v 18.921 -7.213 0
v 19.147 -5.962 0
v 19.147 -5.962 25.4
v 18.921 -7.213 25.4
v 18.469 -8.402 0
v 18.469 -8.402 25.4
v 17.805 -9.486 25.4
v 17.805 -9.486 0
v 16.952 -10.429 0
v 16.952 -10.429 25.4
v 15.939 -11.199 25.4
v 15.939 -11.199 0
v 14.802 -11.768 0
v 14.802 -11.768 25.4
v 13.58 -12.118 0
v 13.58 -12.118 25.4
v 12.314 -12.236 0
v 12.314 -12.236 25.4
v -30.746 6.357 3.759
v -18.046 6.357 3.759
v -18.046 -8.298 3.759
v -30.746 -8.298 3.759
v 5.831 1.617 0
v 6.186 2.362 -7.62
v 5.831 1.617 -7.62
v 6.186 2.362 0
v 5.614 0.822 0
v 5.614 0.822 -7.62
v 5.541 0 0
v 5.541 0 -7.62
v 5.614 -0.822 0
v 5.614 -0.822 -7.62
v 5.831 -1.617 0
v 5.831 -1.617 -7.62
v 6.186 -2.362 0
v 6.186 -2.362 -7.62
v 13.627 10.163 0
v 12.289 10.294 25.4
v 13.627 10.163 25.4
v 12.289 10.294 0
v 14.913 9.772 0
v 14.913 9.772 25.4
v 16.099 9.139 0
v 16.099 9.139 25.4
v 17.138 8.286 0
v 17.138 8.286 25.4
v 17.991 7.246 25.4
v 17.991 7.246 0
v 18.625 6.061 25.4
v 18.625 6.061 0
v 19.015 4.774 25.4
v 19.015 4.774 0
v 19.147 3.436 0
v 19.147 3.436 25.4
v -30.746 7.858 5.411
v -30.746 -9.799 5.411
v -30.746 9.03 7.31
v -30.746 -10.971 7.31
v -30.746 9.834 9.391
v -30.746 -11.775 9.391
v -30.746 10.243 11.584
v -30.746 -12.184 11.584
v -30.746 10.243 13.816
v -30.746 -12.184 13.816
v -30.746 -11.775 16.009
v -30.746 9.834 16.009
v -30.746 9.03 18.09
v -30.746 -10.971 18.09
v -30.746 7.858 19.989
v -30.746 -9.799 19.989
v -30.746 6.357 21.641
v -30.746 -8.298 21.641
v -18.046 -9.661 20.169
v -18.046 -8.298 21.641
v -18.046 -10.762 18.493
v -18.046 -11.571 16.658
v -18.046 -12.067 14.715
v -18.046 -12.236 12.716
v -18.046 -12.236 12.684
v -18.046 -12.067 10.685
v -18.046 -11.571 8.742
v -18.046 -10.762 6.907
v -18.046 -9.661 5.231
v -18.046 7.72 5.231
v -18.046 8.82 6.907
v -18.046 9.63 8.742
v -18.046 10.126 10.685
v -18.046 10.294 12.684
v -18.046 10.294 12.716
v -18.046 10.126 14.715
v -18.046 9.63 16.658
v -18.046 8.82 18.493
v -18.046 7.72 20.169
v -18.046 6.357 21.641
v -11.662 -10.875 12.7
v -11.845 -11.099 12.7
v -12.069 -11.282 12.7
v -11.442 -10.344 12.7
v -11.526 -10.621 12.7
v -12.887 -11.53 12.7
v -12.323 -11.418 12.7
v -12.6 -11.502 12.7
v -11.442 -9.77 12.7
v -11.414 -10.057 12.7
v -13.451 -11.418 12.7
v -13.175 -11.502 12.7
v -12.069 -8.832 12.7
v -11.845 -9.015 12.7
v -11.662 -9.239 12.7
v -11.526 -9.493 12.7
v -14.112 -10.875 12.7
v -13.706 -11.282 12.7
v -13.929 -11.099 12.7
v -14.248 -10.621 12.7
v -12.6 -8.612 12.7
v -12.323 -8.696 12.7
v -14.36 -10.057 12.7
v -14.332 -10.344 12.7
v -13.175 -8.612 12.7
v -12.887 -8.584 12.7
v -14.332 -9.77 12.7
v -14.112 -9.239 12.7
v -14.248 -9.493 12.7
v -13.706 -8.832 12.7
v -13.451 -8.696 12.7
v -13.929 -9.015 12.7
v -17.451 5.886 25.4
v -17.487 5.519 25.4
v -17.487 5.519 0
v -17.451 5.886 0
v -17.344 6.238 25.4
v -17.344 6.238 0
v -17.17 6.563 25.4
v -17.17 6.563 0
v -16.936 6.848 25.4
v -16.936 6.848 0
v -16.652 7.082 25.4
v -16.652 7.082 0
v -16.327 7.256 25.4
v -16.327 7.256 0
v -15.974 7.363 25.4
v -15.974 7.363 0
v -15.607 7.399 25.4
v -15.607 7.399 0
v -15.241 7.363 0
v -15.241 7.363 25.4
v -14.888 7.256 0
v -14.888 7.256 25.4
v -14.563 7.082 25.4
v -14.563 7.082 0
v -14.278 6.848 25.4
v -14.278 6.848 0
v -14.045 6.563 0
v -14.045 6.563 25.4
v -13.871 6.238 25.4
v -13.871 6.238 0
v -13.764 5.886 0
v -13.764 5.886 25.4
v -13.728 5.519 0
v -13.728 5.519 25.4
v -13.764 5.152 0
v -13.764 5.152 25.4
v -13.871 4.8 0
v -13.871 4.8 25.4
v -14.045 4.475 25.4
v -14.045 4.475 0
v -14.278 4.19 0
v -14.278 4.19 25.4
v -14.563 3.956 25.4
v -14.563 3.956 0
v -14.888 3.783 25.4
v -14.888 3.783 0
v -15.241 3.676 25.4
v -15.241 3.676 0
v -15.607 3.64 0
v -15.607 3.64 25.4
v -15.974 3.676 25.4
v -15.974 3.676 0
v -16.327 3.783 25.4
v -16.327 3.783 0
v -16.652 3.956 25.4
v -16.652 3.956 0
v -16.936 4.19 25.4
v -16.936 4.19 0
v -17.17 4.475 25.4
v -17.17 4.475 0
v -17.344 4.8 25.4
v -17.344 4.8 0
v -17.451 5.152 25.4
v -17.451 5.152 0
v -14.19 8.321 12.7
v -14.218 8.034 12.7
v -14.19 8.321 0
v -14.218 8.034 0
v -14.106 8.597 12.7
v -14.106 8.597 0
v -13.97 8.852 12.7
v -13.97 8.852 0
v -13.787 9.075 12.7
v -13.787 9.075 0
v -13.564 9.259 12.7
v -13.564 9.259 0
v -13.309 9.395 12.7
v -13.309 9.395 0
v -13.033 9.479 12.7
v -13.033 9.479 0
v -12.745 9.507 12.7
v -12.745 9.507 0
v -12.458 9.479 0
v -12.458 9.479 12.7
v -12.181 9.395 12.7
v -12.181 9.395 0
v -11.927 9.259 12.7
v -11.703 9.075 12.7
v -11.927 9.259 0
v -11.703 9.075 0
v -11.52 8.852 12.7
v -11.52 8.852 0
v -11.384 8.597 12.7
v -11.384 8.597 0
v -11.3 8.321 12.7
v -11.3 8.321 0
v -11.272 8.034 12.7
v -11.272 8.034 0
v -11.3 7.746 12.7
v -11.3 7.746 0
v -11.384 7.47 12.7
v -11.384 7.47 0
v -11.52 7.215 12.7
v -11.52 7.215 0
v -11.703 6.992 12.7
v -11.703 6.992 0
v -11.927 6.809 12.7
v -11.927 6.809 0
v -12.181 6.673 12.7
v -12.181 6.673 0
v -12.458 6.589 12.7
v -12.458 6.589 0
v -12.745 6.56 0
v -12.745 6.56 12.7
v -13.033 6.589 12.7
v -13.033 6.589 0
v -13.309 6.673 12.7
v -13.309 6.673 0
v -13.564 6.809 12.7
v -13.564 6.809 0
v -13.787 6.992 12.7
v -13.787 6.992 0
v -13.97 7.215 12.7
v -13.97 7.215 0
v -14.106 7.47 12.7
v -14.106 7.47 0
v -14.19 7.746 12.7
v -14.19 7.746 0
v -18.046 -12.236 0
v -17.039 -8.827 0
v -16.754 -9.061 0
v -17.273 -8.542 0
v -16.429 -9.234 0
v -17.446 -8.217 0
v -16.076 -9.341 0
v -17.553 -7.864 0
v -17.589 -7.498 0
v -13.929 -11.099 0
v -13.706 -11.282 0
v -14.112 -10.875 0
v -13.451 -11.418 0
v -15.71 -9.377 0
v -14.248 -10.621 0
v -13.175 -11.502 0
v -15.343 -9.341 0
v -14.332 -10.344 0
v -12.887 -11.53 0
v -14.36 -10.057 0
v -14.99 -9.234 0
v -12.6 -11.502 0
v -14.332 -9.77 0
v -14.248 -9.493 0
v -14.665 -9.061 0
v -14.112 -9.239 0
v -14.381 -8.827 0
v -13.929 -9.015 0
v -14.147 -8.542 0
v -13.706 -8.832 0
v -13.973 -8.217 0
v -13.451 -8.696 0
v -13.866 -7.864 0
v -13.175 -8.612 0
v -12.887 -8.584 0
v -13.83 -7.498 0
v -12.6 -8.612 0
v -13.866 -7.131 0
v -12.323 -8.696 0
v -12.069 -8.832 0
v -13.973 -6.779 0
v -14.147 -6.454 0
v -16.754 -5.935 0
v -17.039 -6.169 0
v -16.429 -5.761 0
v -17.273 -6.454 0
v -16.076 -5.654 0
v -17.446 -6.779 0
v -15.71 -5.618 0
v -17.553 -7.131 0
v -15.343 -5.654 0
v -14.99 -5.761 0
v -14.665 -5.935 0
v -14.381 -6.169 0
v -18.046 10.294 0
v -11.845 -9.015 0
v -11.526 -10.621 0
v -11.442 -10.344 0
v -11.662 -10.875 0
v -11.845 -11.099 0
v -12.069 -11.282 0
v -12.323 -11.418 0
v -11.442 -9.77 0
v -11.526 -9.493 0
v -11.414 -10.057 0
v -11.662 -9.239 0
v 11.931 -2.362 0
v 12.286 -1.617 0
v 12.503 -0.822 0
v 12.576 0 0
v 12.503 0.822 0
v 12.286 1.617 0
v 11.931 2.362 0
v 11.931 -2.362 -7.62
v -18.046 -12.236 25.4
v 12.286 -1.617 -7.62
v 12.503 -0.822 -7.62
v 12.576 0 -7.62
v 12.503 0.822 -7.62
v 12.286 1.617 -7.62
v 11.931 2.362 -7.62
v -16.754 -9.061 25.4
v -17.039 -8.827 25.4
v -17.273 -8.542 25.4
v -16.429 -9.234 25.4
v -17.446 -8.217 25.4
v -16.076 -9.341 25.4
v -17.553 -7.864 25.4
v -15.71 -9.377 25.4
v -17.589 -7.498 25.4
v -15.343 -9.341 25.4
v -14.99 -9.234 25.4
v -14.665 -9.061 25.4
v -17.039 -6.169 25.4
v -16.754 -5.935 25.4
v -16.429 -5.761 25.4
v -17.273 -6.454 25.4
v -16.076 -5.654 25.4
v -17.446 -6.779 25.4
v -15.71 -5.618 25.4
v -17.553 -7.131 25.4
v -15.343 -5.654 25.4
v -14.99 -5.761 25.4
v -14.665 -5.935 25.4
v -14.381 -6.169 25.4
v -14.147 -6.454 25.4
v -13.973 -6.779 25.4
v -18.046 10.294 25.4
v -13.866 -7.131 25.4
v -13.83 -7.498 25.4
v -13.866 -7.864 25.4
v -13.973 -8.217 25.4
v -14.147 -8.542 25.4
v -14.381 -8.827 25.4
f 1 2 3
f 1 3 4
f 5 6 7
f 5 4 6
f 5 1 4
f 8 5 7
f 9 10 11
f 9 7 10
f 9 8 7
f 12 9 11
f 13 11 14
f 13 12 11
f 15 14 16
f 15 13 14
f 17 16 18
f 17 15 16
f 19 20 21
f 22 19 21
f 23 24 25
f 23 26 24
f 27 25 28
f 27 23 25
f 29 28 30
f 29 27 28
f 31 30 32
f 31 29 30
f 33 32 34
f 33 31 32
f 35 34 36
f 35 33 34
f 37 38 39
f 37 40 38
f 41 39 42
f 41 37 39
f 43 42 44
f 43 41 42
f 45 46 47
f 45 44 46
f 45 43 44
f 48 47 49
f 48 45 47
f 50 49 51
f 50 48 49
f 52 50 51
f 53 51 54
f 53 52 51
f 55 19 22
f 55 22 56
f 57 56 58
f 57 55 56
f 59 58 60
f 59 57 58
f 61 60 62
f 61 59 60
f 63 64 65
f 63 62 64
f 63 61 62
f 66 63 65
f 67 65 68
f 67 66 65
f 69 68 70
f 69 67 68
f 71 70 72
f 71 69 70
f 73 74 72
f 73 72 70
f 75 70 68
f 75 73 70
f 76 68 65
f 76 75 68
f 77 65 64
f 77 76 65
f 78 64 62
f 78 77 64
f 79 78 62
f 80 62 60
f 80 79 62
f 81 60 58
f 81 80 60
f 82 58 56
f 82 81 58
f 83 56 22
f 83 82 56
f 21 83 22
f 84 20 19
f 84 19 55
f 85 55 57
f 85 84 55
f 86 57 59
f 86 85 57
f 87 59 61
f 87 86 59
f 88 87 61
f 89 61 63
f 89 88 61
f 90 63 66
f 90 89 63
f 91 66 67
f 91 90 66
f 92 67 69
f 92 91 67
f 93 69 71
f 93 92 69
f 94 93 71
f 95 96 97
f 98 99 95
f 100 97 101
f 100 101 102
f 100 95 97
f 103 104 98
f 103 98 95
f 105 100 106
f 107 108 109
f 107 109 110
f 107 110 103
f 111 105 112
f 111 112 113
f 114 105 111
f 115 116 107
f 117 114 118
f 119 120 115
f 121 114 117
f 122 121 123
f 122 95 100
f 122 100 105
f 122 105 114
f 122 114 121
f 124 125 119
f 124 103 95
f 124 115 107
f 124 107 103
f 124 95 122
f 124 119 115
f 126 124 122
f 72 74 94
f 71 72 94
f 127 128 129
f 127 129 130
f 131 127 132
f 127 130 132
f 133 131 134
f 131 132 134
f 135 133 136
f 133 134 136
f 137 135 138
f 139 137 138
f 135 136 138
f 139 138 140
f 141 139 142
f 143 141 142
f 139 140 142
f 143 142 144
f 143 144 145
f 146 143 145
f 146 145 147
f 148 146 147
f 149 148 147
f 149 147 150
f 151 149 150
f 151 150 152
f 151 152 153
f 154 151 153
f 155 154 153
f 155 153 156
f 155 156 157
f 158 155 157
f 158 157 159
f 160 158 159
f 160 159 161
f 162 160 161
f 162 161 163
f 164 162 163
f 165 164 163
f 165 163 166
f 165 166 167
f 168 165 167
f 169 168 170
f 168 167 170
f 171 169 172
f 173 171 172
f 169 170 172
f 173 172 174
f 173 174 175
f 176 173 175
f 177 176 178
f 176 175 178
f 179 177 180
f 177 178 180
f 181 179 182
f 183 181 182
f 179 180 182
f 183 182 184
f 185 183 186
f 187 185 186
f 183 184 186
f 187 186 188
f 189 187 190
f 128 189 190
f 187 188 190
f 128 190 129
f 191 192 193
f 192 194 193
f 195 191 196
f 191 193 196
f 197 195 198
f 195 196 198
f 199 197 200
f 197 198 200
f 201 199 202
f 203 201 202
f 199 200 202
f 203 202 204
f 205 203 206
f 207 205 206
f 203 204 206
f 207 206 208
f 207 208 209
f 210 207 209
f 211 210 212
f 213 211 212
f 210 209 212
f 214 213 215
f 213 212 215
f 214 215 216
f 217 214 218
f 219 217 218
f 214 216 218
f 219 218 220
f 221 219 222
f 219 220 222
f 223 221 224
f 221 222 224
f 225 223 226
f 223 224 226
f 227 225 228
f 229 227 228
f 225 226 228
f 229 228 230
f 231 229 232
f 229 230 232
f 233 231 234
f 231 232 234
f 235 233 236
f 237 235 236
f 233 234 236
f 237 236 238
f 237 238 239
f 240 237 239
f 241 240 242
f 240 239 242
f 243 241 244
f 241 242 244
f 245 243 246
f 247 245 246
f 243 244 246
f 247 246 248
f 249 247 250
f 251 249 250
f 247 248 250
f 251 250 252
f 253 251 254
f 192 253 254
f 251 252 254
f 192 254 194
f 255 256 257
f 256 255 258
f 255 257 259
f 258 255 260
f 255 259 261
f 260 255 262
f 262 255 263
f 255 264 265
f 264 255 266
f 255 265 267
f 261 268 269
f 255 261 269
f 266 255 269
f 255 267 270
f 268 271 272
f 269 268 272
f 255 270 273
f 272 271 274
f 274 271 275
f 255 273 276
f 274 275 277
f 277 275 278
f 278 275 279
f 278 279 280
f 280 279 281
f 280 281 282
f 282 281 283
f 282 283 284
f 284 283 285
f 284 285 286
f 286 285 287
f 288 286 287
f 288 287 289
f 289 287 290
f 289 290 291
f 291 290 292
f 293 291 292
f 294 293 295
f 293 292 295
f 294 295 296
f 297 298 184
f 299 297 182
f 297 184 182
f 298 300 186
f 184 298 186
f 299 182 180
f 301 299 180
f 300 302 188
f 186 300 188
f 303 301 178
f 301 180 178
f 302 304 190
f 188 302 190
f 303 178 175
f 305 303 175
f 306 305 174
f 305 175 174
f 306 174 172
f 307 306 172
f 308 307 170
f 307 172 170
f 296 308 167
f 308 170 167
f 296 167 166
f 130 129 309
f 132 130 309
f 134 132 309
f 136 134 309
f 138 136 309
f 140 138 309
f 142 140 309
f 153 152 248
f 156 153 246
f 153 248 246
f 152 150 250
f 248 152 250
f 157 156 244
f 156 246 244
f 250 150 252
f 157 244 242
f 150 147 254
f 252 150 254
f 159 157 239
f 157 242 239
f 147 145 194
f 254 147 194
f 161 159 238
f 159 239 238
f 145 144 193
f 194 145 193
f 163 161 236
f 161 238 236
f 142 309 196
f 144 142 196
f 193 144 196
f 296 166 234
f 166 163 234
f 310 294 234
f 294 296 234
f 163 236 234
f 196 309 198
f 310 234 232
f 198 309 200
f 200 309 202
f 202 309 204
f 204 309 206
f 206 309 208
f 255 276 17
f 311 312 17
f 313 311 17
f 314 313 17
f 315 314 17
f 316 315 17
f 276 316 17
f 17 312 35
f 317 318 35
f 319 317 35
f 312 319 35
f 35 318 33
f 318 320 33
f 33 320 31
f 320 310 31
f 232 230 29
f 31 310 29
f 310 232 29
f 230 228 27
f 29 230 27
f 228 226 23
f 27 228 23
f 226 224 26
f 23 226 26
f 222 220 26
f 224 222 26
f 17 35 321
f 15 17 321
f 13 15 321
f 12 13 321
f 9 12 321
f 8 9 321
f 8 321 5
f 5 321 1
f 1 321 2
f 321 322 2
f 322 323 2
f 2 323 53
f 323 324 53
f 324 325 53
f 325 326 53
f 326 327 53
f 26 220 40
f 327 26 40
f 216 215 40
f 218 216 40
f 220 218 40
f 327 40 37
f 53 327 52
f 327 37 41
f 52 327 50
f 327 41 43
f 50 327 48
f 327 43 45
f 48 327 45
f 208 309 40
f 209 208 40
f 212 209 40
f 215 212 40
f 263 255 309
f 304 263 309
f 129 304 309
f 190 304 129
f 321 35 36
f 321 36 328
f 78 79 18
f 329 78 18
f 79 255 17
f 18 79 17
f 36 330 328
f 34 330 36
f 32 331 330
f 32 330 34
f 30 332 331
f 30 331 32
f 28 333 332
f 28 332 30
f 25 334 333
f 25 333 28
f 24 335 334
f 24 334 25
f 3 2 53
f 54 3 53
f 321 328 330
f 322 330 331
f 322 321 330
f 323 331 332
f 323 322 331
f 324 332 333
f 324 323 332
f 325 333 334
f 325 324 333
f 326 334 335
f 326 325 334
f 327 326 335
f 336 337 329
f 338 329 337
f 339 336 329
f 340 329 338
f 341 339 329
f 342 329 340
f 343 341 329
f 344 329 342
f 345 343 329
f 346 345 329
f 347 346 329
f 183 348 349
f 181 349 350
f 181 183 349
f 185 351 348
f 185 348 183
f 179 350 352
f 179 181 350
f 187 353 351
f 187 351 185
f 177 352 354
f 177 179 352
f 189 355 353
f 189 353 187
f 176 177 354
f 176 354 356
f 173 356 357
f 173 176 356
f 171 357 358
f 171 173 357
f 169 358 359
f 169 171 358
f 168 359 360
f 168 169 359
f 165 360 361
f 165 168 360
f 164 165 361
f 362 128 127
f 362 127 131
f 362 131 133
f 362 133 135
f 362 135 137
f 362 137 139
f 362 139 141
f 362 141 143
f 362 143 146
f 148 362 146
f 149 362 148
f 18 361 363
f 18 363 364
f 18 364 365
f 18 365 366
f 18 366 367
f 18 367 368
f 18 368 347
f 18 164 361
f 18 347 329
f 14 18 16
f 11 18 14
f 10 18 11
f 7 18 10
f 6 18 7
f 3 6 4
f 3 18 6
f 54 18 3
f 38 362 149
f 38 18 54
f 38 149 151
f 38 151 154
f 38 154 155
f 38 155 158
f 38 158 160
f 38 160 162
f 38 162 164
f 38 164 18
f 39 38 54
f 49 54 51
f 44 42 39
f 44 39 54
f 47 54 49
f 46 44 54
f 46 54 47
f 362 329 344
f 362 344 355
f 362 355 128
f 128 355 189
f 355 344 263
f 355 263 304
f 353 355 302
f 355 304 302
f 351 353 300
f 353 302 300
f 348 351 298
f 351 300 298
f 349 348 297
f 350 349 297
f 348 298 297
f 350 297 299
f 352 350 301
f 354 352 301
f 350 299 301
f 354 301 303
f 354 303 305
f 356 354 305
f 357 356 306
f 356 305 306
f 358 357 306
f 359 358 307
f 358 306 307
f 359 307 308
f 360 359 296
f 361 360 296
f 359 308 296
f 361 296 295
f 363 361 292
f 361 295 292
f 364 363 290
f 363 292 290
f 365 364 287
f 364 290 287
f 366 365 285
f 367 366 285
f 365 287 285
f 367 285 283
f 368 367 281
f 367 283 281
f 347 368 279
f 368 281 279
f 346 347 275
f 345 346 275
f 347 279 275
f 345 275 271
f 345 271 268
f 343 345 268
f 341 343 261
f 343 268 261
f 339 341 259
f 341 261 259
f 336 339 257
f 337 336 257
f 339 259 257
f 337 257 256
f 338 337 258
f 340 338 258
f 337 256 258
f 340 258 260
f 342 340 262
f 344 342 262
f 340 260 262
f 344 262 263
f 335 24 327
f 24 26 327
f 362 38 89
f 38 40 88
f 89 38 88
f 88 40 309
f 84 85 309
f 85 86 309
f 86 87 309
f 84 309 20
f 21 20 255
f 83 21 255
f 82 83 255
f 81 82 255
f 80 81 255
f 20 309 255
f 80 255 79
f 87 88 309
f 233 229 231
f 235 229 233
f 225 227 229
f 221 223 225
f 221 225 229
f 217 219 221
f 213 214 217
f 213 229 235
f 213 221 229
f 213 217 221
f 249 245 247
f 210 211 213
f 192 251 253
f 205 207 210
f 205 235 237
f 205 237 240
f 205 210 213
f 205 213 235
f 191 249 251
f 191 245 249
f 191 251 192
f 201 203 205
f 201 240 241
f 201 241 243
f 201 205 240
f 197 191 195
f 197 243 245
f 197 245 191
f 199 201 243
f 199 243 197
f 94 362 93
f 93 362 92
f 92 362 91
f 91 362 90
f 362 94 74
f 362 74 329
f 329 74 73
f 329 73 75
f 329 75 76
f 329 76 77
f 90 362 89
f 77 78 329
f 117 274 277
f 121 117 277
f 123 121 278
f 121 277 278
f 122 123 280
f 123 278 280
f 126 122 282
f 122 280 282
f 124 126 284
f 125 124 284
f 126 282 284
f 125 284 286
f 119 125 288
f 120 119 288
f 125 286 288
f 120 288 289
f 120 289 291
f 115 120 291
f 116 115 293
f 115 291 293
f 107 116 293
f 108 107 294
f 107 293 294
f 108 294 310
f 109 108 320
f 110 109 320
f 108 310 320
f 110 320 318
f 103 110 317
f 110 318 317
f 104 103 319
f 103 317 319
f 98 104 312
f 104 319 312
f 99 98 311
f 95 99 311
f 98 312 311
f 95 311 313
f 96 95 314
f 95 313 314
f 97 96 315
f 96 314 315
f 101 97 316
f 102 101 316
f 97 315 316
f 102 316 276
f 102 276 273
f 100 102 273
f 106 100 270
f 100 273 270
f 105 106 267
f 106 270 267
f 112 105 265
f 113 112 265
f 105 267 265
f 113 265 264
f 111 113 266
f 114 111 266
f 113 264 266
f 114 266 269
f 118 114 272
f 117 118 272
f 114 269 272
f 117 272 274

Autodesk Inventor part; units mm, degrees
ref_plane "YZ Plane" through (0, 0, 0) normal (1, 0, 0) x (0, 1, 0)
ref_plane "XZ Plane" through (0, 0, 0) normal (0, 1, 0) x (-1, 0, 0)
ref_plane "XY Plane" through (0, 0, 0) normal (0, 0, 1) x (1, 0, 0)
sketch "Sketch1" plane through (0, 0, 0) normal (0, 0, 1) x (1, 0, 0)
  line L0 (-18.0458, -12.2355) -> (12.3135, -12.2355)
  line L1 (19.1466, -5.9617) -> (19.1466, 3.4363)
  line L2 (12.2886, 10.2943) -> (-18.0458, 10.2943)
  line L3 (-18.0458, 10.2943) -> (-18.0458, -12.2355)
  line L4 (-18.0458, -12.2355) -> (16.3456, 11.0826) construction
  line L5 (18.0458, -10.2943) -> (-18.0458, 10.2943) construction
  arc A0 (19.1466, 3.4363) -> (12.2886, 10.2943) centre (12.2886, 3.4363) ccw
  arc A1 (12.3135, -12.2355) -> (19.1466, -5.9617) centre (12.3135, -5.3775) ccw
  point P0 (0, 0)
  point P1 (19.1466, -1.2627)
  dimension "d3" = 22.5298
  dimension "d10" = 9.398
  dimension "d11" = 6.858
  dimension "d12" = 6.858
extrude "Extrusion1" add sketch "Sketch1" along normal blind 25.4
sketch "Sketch2" plane through (0, 0, 0) normal (0, 0, -1) x (-1, 0, 0)
  line L0 (-12.2886, 10.2943) -> (18.0458, 10.2943) projected
  line L1 (18.0458, 10.2943) -> (18.0458, -12.2355) projected
  circle A0 centre (15.6074, 5.5191) radius 1.8796
  circle A1 centre (12.7451, 8.0337) radius 1.4732
  line L2 (-19.1466, -5.9617) -> (-19.1466, 3.4363) projected
  line L3 (18.0458, 10.2943) -> (18.0458, -12.2355) projected
  circle A2 centre (15.7097, -7.4978) radius 1.8796
  circle A3 centre (12.8872, -10.057) radius 1.4732
  point P0 (0, 0)
  dimension "d13" = 2.4384
  dimension "d14" = 4.7752
  dimension "d15" = 3.7592
  dimension "d16" = 2.9464
  dimension "d17" = 0.4572
  dimension "d18" = 2.2606
sketch "Sketch3" plane through (0, 0, 0) normal (0, 0, -1) x (-1, 0, 0)
  circle A0 centre (-9.0374, 0) radius 4.445
  line L0 (-19.1466, -5.9617) -> (-19.1466, 3.4363) projected
  line L1 (-6.1855, -2.3622) -> (-11.9313, -2.3622)
  line L2 (-6.1855, 2.3622) -> (-11.9313, 2.3622)
  arc A1 (-6.1855, -2.3622) -> (-6.1855, 2.3622) centre (-10.1887, 0) ccw
  arc A2 (-11.9313, 2.3622) -> (-11.9313, -2.3622) centre (-7.9281, 0) ccw
  line L3 (-5.5405, 0) -> (-12.5763, 0)
  line L4 (-9.0584, 2.3622) -> (-9.0584, -2.3622)
  point P0 (0, 0)
  dimension "d23" = 8.89
  dimension "d24" = 10.1092
  dimension "d45" = 4.7244
  dimension "d46" = 4.6482
  dimension "d47" = 4.6482
  dimension "d48" = 7.0358
sketch "Sketch4" plane through (-18.0458, -12.2355, 0) normal (-1, 0, 0) x (0, 0, 1)
  point P0 (0, 0)
  point P1 (25.4, 0)
  point P2 (0, 22.5298)
  point P3 (25.4, 22.5298)
extrude "Extrusion5" cut sketch "Sketch2" against normal blind 25.4 contours A2
extrude "Extrusion6" cut sketch "Sketch2" against normal blind 25.4 contours A0
extrude "Extrusion7" cut sketch "Sketch2" against normal blind 12.7 contours A1 | A3
sketch "Sketch5" plane through (-18.0458, -12.2355, 0) normal (-1, 0, 0) x (0, 0, 1)
  line L0 (25.4, 6.2738) -> (25.4, 15.6718) projected
  line L1 (0, 6.2738) -> (0, 15.6718) projected
  line L2 (0, 0) -> (25.4, 0) projected
  line L3 (12.7, 0) -> (12.7, 22.5298)
  line L4 (0, 22.5298) -> (25.4, 22.5298) projected
  line L5 (25.4, 0) -> (0, 22.5298)
  line L6 (25.4, 15.6718) -> (25.4, 22.5298) projected
  line L7 (0, 0) -> (25.4, 22.5298)
  line L8 (12.7, 3.937) -> (12.7, 18.5928) construction
  line L9 (21.6408, 3.937) -> (21.6408, 18.5928)
  line L10 (3.7592, 18.5928) -> (3.7592, 3.937)
  arc A0 (3.7592, 3.937) -> (21.6408, 3.937) centre (12.7, 12.1206) ccw
  arc A1 (21.6408, 18.5928) -> (3.7592, 18.5928) centre (12.7, 10.4092) ccw
  point P0 (0, 12.2355)
  point P1 (12.7, 11.2649)
  dimension "d39" = 22.5298
  dimension "d41" = 3.7592
extrude "Extrusion8" add sketch "Sketch5" along normal blind 12.7 contours A0 L7 L3 | L3 L5 A0 | A0 L10 A1 L5 L7 | L5 A1 L3 | L7 A1 L9 A0 L5 | L3 A1 L7
extrude "Extrusion9" add sketch "Sketch3" along normal blind 7.62 contours L1 L4 L3 A1 | L1 A2 L3 L4 | L3 L4 L2 A1 | L3 A2 L2 L4
properties part number "motor sumo jeffrey p"
